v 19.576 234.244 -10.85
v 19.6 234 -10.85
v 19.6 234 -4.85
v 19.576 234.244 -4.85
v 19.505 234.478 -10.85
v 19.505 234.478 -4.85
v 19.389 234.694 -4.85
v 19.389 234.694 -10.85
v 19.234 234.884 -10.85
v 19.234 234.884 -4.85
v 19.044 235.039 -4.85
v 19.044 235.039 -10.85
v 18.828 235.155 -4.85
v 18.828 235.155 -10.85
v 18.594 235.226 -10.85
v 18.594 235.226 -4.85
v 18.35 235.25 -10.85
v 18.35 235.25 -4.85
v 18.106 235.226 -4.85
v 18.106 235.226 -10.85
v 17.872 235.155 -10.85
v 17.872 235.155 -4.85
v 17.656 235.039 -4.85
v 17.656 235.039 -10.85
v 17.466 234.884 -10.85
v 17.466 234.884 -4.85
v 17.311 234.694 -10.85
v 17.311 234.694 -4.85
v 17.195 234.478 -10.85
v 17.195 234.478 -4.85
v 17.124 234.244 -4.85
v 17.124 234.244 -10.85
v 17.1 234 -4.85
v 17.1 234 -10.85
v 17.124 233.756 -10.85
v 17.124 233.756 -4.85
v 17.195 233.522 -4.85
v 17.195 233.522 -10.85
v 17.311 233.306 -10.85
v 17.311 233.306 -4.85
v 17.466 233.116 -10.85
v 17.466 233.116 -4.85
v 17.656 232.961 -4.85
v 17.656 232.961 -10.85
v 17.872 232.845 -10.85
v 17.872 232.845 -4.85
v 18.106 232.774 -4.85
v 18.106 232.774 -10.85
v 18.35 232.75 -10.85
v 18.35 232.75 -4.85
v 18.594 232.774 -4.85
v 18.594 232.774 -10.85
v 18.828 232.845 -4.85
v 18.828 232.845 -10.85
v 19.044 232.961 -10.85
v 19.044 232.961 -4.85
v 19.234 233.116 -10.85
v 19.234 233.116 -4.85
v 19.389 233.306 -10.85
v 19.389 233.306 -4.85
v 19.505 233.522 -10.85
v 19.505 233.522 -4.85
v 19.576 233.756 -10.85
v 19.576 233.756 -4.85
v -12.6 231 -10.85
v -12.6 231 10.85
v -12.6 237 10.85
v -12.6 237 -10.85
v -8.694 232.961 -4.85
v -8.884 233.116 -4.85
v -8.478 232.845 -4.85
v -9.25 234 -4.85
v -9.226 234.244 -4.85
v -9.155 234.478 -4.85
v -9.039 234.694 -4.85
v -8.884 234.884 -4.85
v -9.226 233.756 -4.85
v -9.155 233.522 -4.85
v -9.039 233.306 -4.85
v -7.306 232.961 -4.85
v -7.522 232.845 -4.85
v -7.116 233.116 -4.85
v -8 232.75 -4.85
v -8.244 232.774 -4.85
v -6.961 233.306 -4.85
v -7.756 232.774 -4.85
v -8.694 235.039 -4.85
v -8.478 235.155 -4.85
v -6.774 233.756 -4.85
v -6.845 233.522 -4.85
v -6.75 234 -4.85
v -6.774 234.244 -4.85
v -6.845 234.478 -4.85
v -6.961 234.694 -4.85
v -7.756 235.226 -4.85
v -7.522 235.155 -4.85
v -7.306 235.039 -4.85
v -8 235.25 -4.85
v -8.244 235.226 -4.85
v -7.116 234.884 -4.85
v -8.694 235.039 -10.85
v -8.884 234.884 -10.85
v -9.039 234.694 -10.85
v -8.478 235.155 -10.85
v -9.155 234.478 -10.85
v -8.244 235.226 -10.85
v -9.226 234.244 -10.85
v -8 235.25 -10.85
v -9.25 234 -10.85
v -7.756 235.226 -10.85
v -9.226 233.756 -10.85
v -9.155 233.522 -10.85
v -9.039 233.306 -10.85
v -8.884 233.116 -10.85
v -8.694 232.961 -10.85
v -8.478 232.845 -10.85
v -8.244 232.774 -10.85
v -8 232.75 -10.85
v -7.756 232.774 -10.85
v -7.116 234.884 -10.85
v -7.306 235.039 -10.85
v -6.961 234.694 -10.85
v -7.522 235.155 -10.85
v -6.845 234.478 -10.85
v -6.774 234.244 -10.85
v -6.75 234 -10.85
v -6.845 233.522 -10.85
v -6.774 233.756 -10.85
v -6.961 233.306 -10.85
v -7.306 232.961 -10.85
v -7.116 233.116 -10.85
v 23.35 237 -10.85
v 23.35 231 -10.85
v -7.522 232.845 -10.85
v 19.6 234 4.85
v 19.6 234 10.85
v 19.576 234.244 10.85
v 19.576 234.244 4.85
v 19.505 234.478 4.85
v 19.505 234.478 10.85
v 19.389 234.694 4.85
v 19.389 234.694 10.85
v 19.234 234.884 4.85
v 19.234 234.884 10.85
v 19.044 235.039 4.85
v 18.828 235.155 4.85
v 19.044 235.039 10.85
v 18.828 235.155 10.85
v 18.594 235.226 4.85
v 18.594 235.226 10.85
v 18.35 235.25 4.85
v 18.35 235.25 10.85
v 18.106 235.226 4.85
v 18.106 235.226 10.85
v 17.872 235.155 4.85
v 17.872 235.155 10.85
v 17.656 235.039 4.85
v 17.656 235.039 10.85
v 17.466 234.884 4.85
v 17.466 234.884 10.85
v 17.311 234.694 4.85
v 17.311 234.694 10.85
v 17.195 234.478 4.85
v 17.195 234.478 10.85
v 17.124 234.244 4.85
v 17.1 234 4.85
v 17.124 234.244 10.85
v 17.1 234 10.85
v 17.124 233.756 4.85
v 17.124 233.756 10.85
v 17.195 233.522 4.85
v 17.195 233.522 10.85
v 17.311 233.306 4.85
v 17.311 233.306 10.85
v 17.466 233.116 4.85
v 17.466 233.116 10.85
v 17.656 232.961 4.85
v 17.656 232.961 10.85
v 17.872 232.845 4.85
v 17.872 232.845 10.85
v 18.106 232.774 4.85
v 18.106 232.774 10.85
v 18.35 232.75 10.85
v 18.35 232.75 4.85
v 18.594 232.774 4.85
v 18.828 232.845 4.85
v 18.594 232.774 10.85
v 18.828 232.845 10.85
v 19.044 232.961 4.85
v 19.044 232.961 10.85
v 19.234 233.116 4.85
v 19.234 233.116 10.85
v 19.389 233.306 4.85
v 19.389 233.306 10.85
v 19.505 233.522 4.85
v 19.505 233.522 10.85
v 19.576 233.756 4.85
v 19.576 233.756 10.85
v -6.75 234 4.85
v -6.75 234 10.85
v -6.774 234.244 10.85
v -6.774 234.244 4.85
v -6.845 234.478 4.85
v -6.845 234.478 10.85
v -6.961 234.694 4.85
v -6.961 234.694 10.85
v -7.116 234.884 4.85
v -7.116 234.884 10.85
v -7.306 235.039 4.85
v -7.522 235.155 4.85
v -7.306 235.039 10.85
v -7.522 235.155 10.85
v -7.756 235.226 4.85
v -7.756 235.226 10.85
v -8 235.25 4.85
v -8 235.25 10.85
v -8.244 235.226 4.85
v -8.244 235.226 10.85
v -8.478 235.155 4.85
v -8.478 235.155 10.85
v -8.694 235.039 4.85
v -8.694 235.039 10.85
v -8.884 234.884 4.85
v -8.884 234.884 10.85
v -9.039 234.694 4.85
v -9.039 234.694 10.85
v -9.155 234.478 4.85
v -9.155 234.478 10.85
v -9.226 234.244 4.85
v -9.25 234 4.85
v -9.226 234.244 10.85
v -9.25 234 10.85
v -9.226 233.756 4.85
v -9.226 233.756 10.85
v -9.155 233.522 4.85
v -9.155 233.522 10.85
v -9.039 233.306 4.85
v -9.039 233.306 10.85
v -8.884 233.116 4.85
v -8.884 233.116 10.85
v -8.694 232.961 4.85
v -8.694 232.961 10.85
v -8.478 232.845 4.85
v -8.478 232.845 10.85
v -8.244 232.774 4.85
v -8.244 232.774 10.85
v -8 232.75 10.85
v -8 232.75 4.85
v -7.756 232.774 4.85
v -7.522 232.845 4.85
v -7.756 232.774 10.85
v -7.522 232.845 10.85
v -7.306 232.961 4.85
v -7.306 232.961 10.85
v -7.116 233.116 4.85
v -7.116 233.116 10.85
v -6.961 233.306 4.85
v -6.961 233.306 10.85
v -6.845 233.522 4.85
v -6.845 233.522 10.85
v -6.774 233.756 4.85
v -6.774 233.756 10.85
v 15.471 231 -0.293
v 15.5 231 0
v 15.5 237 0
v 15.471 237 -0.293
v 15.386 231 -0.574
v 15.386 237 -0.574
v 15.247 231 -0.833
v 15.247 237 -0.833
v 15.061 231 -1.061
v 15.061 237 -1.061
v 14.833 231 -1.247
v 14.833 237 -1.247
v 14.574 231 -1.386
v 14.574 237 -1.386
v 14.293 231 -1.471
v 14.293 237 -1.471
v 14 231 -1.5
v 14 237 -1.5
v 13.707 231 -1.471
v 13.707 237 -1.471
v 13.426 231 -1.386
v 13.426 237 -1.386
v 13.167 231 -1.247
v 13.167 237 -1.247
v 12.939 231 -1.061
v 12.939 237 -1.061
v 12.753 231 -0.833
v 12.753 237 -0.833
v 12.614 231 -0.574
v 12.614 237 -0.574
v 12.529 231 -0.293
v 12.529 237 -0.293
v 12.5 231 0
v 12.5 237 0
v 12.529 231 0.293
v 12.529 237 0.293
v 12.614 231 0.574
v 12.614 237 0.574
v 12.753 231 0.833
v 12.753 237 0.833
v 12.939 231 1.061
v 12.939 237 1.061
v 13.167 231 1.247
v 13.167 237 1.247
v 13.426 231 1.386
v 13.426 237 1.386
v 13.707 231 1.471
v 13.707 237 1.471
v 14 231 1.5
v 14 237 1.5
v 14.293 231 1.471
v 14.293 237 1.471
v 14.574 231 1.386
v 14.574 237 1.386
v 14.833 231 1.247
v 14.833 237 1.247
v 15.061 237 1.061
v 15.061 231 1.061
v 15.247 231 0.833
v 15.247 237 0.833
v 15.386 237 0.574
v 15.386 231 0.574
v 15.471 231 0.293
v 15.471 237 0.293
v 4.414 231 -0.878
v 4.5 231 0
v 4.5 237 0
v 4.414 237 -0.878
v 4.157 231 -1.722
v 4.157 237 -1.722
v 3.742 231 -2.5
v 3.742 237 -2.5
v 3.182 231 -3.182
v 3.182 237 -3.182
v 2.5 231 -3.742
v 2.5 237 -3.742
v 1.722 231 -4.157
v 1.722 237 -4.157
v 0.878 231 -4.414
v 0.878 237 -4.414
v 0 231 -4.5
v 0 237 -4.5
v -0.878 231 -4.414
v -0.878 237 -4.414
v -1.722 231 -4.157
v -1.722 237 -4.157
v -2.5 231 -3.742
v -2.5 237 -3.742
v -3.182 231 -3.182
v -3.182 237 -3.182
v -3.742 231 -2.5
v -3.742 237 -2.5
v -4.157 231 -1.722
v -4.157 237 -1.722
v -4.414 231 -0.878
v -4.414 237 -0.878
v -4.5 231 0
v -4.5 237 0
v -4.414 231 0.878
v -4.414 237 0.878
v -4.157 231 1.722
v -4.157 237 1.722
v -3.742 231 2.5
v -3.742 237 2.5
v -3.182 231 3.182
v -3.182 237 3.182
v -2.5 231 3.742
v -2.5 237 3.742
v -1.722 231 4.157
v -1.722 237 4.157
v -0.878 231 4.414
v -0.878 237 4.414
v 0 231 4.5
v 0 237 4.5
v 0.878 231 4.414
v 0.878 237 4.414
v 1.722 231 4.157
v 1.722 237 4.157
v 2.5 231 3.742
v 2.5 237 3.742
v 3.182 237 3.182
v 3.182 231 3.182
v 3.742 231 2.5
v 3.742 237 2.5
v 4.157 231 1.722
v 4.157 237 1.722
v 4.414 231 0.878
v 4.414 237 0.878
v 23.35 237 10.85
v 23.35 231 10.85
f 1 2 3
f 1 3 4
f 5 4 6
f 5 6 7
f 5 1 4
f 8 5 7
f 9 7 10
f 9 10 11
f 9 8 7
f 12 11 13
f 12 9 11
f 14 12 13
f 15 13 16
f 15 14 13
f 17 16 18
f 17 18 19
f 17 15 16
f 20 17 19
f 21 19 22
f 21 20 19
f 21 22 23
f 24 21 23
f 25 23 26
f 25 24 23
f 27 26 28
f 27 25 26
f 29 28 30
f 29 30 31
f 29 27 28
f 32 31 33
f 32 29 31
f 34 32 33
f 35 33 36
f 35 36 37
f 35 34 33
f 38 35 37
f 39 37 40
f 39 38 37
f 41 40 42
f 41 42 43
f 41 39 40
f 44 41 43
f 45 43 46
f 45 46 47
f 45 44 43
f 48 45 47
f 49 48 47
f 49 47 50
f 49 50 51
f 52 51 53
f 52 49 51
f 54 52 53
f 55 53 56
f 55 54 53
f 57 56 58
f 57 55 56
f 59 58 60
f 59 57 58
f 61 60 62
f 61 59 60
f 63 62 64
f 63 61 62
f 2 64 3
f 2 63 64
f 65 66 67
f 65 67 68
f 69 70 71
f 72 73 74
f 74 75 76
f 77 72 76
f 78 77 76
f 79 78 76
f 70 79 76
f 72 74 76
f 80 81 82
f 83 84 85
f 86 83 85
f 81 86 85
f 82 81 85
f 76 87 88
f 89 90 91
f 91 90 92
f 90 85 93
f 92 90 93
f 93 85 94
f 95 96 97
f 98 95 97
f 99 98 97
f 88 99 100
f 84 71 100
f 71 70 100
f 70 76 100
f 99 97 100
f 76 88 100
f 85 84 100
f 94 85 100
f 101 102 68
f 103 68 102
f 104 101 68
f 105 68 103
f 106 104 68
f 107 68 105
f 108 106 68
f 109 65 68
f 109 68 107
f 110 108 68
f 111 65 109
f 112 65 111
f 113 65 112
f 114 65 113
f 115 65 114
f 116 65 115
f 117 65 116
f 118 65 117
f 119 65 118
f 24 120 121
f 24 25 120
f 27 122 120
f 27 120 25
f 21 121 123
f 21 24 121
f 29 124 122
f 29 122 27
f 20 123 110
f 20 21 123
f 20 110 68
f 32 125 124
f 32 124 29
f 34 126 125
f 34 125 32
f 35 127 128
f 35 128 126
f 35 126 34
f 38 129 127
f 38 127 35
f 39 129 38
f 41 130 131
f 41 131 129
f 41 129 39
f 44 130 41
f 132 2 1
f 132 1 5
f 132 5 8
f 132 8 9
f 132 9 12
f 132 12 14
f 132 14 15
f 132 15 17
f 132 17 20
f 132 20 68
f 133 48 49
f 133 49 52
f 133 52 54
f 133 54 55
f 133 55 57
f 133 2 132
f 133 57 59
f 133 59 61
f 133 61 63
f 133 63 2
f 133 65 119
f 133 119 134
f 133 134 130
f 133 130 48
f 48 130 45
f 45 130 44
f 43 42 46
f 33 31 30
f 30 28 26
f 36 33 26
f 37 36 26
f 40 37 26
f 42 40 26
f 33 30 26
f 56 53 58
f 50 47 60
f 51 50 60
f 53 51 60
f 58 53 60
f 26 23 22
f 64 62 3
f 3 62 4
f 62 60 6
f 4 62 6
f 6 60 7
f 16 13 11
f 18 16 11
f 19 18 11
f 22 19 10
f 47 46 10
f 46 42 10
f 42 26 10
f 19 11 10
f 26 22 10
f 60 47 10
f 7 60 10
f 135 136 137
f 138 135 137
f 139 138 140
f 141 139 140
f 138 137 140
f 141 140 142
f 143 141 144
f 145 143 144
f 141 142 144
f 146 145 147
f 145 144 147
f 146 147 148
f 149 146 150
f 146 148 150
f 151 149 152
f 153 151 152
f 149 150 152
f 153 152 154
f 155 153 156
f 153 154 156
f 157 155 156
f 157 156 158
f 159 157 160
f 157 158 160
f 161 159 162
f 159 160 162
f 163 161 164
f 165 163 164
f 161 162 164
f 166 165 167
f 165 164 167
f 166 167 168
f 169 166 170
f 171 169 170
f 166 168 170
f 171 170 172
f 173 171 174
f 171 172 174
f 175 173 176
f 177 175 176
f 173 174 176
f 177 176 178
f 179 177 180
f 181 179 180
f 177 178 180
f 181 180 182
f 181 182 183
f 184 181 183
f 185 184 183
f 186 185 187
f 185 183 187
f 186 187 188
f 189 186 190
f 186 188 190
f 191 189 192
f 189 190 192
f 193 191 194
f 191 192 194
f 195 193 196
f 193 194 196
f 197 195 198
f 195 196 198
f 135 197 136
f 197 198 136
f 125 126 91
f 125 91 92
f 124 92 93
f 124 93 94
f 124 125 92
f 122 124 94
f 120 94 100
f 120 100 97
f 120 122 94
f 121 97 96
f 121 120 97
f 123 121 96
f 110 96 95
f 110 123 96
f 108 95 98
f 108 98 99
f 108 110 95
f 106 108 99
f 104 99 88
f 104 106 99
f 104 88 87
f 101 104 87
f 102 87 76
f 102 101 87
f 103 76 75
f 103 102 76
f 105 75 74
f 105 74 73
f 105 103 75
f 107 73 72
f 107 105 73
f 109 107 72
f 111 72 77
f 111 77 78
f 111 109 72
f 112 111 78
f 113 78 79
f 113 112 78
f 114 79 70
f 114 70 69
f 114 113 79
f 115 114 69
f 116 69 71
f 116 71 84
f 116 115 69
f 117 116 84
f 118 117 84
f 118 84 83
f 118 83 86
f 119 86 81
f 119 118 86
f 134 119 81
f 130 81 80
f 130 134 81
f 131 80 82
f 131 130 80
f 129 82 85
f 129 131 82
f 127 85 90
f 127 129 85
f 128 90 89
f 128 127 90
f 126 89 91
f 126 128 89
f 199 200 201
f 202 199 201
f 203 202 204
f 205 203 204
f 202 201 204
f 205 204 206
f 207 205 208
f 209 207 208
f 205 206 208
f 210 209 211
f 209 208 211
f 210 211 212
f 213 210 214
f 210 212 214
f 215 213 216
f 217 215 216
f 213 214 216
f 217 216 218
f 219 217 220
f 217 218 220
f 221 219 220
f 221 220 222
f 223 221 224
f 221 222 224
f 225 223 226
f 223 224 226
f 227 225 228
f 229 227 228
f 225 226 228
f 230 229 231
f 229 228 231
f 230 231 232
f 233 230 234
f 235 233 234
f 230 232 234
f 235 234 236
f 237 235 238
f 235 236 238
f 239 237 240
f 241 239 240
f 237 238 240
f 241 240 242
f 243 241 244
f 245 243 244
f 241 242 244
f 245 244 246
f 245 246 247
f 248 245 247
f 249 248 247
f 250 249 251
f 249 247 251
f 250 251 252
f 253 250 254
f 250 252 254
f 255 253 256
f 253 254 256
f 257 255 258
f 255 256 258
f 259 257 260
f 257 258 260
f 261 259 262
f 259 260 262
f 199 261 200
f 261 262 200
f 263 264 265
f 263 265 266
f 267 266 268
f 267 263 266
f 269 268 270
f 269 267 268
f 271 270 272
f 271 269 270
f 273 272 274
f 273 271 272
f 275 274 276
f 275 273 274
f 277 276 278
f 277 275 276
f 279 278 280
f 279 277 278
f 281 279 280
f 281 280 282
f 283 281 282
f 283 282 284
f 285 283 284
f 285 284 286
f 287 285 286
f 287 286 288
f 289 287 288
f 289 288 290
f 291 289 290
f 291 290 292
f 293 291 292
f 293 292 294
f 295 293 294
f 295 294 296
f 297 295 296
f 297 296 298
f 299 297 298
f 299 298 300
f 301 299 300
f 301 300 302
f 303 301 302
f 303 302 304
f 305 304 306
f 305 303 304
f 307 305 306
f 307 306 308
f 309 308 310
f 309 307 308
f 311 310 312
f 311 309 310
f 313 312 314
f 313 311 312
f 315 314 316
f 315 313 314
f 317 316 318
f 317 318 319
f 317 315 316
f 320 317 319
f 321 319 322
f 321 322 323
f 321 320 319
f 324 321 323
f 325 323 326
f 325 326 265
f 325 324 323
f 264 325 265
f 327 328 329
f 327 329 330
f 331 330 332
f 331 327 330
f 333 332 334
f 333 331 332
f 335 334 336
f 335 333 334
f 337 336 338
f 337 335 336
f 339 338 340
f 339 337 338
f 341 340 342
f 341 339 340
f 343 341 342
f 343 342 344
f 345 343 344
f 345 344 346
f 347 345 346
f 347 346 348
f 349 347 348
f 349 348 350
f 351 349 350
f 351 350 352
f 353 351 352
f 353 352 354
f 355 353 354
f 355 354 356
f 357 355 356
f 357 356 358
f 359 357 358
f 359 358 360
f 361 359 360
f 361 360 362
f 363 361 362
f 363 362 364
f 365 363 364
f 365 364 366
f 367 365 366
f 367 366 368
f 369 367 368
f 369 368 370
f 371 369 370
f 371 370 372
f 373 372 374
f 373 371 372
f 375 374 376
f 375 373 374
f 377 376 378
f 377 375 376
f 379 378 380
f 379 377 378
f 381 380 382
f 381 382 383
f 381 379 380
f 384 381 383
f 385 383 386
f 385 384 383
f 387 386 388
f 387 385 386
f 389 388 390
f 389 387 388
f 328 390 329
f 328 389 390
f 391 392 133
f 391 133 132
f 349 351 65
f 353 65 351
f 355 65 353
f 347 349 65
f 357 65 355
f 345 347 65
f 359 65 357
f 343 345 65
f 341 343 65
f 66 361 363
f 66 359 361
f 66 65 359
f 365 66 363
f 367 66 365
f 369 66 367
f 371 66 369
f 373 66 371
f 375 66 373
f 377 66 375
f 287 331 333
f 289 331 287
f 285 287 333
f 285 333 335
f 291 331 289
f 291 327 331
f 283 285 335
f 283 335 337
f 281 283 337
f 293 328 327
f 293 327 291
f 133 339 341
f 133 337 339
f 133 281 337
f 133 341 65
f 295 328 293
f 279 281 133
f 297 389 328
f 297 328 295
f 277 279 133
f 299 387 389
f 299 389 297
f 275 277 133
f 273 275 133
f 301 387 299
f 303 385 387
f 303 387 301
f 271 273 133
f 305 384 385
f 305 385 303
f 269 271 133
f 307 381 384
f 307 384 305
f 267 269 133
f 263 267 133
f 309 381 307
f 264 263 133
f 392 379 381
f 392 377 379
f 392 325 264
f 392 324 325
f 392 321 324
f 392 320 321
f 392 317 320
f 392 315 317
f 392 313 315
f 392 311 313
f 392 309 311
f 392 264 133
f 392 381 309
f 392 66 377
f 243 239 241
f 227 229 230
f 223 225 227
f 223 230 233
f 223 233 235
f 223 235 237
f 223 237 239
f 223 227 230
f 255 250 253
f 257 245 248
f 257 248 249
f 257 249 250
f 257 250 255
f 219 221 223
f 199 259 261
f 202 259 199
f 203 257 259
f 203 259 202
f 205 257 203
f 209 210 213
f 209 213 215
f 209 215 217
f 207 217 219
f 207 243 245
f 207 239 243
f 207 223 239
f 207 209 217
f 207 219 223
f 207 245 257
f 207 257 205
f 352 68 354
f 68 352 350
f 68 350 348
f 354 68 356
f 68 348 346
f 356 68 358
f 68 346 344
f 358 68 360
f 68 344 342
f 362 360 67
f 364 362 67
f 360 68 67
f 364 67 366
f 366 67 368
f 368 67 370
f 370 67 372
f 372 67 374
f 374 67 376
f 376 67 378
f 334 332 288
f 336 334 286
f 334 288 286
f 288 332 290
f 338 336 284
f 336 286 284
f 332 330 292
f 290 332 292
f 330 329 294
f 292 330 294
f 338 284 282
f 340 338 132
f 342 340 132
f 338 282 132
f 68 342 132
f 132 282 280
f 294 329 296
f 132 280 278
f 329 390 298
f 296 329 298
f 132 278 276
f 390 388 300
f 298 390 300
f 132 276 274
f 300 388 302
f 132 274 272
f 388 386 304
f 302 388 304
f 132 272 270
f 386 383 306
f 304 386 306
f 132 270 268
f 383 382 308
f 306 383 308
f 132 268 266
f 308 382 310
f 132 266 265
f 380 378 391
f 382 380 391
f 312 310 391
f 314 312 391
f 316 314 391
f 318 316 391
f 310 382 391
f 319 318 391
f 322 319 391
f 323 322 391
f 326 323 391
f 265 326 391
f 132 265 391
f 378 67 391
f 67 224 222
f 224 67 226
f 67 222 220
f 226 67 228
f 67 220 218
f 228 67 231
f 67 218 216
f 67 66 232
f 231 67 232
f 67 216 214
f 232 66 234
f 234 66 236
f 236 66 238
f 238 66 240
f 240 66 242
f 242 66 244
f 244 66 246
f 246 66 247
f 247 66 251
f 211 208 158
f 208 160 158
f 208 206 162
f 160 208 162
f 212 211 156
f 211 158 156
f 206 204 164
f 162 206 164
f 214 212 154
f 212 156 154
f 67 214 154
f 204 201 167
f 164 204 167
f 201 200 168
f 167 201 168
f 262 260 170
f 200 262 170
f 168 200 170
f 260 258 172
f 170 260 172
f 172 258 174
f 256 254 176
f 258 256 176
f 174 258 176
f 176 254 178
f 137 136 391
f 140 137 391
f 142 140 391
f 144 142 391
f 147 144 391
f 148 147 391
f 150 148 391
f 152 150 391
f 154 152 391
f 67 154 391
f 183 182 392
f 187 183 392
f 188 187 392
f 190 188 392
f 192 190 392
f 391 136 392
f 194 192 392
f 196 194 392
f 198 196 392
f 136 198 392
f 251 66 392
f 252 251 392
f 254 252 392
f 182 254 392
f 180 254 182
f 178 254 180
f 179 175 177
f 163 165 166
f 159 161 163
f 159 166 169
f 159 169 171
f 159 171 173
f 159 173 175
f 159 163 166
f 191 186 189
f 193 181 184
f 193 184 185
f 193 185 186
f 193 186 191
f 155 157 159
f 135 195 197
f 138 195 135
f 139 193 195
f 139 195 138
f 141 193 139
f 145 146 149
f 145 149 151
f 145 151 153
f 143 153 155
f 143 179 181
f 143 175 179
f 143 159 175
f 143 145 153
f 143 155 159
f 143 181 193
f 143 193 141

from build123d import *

# Parameters (mm, degrees)
SKIZZE3_W                            = 46.7
SKIZZE3_H                            = 6
AUFSATZ_LINEAR_AUSTRAGEN1_DEPTH      = 12.65
AUFSATZ_LINEAR_AUSTRAGEN1_DEPTH_BACK = 12.65
SKIZZE4_OUTSIDE_W                    = 59.39
SKIZZE4_OUTSIDE_H                    = 37.99
SKIZZE4_OUTSIDE_W_2                  = 35.95
SKIZZE4_OUTSIDE_H_2                  = 21.7
SCHNITT_LINEAR_AUSTRAGEN1_DEPTH      = 237
SKIZZE7_R                            = 4.5
SKIZZE7_R_2                          = 1.5
SCHNITT_LINEAR_AUSTRAGEN2_DEPTH      = 237
SCHNITT_LINEAR_START                 = -10.85
THREADHOLESSIDE_R                    = 1.25
SCHNITT_LINEAR_AUSTRAGEN3_DEPTH      = 6
SCHNITT_LINEAR_START_2               = 10.85
THREADHOLESSIDE_2_R                  = 1.25
SCHNITT_LINEAR_AUSTRAGEN4_DEPTH      = 6


with BuildPart() as part:
    # Skizze3 → Aufsatz-Linear austragen1 (new body, two sides)
    with BuildSketch(Plane.XY) as aufsatz_linear_austragen1_sk:
        with Locations((0, 234)):
            Rectangle(SKIZZE3_W, SKIZZE3_H)
    extrude(amount=AUFSATZ_LINEAR_AUSTRAGEN1_DEPTH)
    extrude(aufsatz_linear_austragen1_sk.sketch, amount=-AUFSATZ_LINEAR_AUSTRAGEN1_DEPTH_BACK)

    # Skizze4 outside → Schnitt-Linear austragen1 (cut)
    with BuildSketch(Plane(origin=(0, 0, 0), x_dir=(1, 0, 0), z_dir=(0, 1, 0))):
        Rectangle(SKIZZE4_OUTSIDE_W, SKIZZE4_OUTSIDE_H)
        with Locations((5.375, 0)):
            Rectangle(SKIZZE4_OUTSIDE_W_2, SKIZZE4_OUTSIDE_H_2, mode=Mode.SUBTRACT)
    extrude(amount=SCHNITT_LINEAR_AUSTRAGEN1_DEPTH, mode=Mode.SUBTRACT)

    # Skizze7 → Schnitt-Linear austragen2 (cut)
    with BuildSketch(Plane(origin=(0, 0, 0), x_dir=(1, 0, 0), z_dir=(0, 1, 0))):
        Circle(SKIZZE7_R)
        with Locations((14, 0)):
            Circle(SKIZZE7_R_2)
    extrude(amount=SCHNITT_LINEAR_AUSTRAGEN2_DEPTH, mode=Mode.SUBTRACT)

    # ThreadHolesSide → Schnitt-Linear austragen3 (cut)
    with BuildSketch(Plane.XY.offset(SCHNITT_LINEAR_START)):
        with Locations((18.35, 234)):
            Circle(THREADHOLESSIDE_R)
        with Locations((-8, 234)):
            Circle(THREADHOLESSIDE_R)
    extrude(amount=SCHNITT_LINEAR_AUSTRAGEN3_DEPTH, mode=Mode.SUBTRACT)

    # ThreadHolesSide<2> → Schnitt-Linear austragen4 (cut)
    with BuildSketch(Plane.XY.offset(SCHNITT_LINEAR_START_2)):
        with Locations((18.35, 234)):
            Circle(THREADHOLESSIDE_2_R)
        with Locations((-8, 234)):
            Circle(THREADHOLESSIDE_2_R)
        with Locations((18.35, 615)):
            Circle(THREADHOLESSIDE_2_R)
        with Locations((-8, 615)):
            Circle(THREADHOLESSIDE_2_R)
    extrude(amount=-SCHNITT_LINEAR_AUSTRAGEN4_DEPTH, mode=Mode.SUBTRACT)


solid = part.part
